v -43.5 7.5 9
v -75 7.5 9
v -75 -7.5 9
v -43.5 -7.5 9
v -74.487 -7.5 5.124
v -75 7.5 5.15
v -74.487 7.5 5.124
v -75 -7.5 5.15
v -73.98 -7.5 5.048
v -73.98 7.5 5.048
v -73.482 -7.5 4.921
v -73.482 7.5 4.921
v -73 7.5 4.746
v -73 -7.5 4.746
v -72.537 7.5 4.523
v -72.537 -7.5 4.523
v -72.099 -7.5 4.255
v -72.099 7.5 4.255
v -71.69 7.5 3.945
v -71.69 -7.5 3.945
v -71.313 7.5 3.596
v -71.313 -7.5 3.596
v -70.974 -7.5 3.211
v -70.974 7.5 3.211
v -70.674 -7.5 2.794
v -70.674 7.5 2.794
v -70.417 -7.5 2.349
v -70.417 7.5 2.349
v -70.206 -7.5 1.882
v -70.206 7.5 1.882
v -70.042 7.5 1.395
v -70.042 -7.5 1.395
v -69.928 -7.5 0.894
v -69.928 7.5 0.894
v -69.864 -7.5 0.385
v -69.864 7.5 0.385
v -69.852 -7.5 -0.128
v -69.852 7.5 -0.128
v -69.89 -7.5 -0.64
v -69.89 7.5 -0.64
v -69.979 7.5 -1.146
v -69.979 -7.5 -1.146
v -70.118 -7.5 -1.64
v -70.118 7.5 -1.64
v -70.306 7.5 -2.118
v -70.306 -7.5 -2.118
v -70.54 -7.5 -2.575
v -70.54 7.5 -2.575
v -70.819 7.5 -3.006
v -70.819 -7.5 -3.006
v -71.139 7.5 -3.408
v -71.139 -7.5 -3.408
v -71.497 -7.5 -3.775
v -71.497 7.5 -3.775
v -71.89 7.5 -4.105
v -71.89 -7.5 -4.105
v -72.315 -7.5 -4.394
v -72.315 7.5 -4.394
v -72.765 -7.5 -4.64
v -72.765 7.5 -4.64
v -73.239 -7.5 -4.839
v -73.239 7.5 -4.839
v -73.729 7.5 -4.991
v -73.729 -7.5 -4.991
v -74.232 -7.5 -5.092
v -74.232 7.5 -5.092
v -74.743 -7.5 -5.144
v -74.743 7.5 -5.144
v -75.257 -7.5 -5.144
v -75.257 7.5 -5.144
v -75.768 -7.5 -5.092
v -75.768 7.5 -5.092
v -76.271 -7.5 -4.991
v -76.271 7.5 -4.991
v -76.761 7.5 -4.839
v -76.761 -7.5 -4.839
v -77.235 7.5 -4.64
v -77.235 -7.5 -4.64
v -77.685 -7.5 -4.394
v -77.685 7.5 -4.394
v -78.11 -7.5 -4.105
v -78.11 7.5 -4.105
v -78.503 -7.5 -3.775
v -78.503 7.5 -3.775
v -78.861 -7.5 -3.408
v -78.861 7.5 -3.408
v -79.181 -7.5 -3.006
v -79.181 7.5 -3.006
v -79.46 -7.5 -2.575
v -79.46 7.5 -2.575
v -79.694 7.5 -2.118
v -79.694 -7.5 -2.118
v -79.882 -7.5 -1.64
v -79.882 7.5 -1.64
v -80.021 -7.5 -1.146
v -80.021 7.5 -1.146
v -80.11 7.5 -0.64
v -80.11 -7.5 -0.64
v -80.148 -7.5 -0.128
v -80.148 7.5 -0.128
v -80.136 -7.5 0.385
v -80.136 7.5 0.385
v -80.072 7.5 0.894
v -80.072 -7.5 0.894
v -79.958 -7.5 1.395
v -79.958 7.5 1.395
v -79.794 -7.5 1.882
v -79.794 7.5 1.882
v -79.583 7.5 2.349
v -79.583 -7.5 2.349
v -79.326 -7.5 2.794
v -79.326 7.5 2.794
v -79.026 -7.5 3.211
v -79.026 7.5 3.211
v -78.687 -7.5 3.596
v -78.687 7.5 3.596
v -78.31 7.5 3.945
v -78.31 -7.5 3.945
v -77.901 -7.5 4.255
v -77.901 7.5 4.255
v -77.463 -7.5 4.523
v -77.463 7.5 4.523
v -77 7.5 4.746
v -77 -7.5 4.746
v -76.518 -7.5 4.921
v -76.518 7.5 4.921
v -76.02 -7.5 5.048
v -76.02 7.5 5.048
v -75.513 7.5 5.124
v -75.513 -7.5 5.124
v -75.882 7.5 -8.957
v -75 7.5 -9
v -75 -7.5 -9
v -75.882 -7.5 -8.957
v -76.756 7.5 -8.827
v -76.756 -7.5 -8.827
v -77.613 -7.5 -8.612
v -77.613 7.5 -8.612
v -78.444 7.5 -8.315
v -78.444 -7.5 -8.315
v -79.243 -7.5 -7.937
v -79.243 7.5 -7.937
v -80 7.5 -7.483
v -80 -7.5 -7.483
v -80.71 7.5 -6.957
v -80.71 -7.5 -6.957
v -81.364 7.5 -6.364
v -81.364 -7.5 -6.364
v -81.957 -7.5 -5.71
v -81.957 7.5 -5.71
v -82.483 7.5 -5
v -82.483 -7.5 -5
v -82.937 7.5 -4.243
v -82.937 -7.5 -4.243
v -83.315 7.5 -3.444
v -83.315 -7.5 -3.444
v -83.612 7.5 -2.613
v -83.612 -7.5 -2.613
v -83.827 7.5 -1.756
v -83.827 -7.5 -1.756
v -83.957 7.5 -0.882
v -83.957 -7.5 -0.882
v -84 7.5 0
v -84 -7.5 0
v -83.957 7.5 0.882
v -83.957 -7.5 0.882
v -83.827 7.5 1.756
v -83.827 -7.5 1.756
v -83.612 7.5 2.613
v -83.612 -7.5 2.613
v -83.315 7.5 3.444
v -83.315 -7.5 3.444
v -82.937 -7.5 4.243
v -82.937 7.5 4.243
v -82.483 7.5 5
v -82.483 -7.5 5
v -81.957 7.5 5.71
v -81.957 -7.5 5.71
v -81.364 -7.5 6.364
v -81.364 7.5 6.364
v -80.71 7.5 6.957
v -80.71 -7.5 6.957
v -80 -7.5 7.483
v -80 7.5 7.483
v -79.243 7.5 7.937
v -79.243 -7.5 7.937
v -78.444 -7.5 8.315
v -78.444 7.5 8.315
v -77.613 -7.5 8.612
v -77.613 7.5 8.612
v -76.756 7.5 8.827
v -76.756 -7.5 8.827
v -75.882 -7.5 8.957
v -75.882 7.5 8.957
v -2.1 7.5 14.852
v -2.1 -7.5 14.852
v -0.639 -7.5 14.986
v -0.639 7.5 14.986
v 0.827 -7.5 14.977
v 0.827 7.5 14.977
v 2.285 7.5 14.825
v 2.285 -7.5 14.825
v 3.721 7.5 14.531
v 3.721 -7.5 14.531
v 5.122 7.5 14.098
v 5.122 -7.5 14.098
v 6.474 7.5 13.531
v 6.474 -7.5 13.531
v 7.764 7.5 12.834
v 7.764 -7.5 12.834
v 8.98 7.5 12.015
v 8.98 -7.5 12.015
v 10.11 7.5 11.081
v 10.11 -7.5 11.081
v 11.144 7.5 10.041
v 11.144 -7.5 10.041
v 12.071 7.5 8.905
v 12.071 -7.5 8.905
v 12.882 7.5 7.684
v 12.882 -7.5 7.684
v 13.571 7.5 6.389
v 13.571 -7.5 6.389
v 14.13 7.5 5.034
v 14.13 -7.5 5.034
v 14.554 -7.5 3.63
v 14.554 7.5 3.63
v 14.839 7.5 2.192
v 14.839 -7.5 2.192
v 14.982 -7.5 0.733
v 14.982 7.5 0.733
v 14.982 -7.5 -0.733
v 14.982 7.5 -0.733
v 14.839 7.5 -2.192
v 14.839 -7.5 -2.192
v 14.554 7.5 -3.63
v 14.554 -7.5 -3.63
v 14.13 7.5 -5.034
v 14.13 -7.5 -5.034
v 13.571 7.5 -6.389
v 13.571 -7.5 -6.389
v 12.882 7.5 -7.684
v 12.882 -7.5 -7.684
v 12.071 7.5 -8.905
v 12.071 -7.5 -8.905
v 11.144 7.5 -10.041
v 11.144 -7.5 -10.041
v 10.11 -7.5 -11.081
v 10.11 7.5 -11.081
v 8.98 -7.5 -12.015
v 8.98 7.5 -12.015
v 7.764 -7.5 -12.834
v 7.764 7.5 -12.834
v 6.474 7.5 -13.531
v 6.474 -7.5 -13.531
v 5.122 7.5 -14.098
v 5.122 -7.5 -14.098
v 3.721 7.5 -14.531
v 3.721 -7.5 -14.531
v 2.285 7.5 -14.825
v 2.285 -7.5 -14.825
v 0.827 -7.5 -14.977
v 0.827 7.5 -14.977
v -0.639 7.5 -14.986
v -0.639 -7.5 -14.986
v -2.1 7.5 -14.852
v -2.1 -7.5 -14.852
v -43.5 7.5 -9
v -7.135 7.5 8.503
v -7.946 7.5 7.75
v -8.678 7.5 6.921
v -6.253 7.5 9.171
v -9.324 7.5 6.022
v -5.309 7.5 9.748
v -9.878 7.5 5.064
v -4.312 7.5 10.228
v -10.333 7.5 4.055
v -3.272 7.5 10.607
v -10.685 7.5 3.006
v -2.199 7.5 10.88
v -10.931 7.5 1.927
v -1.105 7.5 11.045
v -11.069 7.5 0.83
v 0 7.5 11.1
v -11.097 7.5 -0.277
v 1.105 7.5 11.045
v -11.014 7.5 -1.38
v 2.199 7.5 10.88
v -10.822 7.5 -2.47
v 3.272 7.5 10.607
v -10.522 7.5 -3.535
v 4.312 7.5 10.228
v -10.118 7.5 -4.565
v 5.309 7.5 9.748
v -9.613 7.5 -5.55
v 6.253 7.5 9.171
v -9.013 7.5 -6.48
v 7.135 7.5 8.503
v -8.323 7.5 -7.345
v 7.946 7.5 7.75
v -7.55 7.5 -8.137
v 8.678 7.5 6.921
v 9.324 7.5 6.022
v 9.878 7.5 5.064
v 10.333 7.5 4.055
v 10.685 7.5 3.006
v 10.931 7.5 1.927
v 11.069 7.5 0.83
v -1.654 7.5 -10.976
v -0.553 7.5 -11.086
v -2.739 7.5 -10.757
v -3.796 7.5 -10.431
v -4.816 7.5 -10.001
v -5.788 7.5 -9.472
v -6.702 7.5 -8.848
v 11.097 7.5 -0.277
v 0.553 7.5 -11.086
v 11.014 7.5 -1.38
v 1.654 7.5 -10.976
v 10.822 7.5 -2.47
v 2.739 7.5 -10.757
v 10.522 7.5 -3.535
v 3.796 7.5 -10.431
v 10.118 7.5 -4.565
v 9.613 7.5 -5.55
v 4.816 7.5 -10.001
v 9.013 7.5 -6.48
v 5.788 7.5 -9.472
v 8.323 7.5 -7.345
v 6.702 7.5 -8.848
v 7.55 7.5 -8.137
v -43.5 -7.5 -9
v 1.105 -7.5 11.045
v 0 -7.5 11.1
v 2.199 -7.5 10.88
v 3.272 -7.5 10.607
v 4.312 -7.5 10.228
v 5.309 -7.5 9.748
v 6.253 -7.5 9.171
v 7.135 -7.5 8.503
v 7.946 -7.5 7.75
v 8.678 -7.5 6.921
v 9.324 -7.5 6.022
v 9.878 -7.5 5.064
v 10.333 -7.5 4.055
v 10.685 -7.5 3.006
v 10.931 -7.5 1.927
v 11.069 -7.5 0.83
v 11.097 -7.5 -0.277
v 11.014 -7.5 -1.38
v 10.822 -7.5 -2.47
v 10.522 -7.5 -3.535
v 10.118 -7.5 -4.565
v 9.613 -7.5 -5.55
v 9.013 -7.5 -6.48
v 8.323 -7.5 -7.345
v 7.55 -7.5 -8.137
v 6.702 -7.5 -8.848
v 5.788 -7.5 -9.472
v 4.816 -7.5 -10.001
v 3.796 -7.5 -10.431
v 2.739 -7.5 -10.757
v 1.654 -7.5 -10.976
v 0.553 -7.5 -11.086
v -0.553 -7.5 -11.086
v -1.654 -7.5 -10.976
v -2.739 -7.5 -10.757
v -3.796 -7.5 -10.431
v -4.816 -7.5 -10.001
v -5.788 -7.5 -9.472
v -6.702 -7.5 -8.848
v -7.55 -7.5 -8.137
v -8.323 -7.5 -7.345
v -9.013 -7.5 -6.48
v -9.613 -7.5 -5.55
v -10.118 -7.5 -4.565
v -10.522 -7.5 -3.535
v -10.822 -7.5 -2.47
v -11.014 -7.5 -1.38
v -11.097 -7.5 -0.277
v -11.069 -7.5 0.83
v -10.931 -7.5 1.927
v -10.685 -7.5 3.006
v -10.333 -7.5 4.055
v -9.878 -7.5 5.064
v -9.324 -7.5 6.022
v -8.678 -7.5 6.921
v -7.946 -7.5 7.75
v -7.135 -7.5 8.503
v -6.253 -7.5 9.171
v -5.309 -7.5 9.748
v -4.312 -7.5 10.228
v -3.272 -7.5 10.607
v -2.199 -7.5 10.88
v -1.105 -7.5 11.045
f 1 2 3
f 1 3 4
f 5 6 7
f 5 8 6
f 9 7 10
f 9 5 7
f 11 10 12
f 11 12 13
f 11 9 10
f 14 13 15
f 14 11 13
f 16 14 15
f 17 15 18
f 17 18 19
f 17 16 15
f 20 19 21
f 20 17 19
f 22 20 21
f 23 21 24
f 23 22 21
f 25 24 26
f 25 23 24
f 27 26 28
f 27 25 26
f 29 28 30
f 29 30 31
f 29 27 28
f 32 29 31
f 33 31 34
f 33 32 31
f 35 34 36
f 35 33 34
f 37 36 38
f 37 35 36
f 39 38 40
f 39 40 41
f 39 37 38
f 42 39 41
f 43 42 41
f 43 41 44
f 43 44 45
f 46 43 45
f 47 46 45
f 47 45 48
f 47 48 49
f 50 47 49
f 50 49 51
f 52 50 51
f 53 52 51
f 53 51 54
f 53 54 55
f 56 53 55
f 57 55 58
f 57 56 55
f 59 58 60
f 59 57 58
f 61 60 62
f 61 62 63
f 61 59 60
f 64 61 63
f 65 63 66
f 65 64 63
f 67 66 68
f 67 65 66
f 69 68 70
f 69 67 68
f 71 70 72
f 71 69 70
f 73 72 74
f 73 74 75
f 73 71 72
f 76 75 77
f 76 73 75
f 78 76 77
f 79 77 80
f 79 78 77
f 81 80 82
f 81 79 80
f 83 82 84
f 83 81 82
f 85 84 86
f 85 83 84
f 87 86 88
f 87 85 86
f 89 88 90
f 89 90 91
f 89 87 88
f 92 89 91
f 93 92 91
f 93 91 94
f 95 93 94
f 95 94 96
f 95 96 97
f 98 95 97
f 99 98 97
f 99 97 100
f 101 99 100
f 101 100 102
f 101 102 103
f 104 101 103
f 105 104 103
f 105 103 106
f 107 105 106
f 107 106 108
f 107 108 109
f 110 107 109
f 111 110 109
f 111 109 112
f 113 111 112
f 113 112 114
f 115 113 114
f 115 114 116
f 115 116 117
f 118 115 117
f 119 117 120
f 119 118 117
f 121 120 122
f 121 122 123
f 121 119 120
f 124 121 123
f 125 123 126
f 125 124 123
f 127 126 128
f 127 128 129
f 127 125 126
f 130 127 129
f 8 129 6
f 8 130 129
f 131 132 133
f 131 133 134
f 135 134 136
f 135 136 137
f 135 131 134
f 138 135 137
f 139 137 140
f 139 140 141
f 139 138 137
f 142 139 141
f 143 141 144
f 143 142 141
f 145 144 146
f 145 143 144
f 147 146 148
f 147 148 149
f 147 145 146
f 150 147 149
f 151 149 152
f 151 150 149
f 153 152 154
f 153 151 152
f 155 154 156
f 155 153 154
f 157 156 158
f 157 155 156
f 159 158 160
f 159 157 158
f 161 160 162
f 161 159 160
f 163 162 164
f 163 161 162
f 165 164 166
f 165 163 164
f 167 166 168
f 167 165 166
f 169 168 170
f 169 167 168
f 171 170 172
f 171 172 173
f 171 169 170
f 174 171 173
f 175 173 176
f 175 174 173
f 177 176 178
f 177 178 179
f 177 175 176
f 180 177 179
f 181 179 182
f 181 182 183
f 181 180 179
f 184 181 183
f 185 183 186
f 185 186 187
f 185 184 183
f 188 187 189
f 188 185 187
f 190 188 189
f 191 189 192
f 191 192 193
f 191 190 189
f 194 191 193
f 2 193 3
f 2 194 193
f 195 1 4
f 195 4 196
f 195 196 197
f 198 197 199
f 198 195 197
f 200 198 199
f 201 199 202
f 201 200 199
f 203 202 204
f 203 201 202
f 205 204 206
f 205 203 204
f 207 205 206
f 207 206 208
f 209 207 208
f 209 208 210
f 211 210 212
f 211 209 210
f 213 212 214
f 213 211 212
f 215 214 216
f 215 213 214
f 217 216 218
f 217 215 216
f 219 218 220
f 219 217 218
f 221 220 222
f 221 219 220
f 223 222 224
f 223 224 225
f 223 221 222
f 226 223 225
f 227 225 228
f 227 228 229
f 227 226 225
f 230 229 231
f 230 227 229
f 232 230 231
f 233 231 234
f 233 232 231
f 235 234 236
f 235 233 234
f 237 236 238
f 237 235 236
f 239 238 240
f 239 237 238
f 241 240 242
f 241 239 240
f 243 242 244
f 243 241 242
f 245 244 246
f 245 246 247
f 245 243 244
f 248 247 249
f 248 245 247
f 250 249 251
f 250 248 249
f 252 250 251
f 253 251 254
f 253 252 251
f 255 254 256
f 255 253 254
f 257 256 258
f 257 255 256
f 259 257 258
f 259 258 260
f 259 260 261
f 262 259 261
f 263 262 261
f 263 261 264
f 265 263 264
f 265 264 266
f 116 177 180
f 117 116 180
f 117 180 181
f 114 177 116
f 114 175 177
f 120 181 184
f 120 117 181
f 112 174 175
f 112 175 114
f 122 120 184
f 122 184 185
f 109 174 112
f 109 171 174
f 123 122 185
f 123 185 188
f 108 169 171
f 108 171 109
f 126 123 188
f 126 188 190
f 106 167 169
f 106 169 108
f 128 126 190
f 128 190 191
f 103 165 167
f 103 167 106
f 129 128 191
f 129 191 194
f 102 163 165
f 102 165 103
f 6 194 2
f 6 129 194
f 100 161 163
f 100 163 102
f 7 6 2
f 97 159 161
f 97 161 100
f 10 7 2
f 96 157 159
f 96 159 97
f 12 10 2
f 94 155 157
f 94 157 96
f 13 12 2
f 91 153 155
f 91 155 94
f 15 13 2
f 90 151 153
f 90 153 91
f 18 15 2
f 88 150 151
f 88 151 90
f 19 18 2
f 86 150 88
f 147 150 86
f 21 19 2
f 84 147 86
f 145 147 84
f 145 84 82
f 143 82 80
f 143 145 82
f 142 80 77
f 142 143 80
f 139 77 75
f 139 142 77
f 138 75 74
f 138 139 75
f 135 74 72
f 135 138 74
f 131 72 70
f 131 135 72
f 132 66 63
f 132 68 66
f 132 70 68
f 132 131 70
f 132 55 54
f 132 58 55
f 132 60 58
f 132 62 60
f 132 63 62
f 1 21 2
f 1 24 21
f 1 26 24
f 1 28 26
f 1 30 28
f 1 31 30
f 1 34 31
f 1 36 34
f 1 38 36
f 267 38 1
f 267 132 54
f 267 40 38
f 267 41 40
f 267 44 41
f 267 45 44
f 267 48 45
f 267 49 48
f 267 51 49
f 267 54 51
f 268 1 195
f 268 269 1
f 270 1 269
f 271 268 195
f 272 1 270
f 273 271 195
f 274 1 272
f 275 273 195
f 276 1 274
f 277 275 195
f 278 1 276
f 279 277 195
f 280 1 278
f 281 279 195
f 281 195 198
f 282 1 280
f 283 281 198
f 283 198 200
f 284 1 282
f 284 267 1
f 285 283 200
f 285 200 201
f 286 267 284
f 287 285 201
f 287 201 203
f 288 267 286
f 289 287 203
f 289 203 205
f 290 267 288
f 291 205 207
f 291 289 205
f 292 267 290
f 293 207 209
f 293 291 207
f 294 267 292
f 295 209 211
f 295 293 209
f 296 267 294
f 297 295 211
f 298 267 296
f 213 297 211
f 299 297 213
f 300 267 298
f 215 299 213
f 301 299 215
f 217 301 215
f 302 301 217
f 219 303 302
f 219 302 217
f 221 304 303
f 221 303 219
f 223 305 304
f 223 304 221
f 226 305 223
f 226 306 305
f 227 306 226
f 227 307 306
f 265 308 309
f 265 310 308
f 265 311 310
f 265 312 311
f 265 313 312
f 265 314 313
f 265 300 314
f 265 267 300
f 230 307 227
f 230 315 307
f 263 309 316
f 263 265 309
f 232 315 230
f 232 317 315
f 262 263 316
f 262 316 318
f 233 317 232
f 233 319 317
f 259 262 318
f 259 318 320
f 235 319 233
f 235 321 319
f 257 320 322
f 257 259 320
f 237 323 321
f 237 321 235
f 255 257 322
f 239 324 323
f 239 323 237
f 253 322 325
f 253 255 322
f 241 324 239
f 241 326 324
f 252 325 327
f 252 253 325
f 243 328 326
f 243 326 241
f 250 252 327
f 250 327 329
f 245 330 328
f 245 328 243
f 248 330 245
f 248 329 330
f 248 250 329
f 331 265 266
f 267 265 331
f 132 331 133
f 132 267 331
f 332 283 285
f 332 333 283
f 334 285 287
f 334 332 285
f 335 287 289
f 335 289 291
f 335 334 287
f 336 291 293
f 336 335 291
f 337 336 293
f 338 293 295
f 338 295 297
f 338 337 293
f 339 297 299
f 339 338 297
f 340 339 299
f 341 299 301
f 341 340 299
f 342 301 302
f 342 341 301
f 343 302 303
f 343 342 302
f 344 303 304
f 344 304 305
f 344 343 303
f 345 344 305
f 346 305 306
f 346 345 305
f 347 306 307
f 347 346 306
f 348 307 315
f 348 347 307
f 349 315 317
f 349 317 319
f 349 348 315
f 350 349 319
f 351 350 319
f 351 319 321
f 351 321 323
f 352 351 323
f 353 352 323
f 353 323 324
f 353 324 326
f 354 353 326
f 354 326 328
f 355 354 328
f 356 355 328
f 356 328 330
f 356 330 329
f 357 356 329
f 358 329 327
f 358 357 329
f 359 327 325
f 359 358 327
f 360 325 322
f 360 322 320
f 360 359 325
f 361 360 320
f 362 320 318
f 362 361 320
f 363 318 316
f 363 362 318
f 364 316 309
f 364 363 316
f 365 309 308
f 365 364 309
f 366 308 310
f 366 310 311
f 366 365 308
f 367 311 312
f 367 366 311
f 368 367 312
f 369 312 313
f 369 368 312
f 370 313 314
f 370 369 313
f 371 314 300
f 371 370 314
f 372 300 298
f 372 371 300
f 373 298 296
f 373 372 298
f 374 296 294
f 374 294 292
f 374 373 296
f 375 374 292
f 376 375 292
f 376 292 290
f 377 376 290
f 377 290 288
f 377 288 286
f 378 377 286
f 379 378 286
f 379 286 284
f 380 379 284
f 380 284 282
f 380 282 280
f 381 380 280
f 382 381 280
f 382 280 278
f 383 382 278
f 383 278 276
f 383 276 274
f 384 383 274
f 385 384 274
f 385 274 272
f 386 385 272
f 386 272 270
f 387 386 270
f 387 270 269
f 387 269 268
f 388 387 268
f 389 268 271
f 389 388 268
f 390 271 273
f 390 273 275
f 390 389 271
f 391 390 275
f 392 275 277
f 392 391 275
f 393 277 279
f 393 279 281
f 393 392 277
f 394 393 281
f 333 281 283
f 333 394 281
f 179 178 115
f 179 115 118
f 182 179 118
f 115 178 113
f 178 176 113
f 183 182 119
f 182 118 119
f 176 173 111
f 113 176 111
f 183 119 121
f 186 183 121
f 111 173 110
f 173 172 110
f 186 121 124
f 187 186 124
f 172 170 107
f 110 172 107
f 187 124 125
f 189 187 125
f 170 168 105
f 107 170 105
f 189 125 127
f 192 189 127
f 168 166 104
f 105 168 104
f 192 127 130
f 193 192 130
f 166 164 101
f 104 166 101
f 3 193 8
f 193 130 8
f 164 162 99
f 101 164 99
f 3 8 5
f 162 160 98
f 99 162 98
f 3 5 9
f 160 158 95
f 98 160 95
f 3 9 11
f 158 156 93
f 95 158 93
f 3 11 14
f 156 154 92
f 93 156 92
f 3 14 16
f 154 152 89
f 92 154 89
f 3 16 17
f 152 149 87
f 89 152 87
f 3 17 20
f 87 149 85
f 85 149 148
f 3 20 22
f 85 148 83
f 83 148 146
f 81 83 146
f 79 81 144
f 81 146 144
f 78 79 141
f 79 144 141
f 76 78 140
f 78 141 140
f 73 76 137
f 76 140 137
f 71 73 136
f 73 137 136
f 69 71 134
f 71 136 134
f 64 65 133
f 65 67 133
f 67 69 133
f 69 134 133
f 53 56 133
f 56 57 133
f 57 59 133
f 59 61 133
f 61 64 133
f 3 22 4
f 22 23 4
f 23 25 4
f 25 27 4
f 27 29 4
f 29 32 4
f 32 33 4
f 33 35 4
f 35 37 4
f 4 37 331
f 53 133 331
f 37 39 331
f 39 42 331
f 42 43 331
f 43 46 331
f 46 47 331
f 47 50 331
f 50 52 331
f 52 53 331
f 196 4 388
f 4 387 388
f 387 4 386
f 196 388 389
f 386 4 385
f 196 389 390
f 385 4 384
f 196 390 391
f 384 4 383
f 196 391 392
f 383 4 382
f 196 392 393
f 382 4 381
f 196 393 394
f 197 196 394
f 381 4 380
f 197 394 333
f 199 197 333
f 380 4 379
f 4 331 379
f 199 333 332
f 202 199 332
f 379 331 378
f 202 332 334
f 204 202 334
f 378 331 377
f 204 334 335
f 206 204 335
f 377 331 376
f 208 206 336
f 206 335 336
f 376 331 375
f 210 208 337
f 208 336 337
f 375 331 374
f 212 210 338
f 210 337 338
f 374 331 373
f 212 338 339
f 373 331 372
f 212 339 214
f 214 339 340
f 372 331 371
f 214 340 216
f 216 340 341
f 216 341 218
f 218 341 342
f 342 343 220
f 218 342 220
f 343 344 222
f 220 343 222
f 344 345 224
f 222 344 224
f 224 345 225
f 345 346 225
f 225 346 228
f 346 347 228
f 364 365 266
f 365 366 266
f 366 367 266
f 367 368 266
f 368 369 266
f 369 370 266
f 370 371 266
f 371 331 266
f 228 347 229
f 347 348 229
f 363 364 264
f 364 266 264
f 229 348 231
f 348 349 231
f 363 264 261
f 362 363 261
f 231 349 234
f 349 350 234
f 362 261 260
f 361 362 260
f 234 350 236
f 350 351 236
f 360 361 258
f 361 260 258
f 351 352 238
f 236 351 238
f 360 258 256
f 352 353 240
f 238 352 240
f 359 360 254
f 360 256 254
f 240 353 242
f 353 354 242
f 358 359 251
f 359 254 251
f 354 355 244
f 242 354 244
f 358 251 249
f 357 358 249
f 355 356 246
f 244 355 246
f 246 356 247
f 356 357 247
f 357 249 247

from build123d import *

# Parameters (mm, degrees)
SKETCH2_R           = 11.1
SKETCH2_R_2         = 5.15
BOSS_EXTRUDE2_DEPTH = 7.5


with BuildPart() as part:
    # Sketch2 → Boss-Extrude2 (new, symmetric)
    with BuildSketch(Plane(origin=(0, 0, 0), x_dir=(1, 0, 0), z_dir=(0, 1, 0))):
        with BuildLine():
            Line((-43.5, 9), (-75, 9))
            ThreePointArc((-75, 9), (-84, 0), (-75, -9))
            Line((-75, -9), (-43.5, -9))
            Line((-43.5, -9), (-2.099515649, -14.852341029))
            ThreePointArc((-2.099515649, -14.852341029), (15, 0), (-2.099515649, 14.852341029))
            Line((-2.099515649, 14.852341029), (-43.5, 9))
        make_face()
        Circle(SKETCH2_R, mode=Mode.SUBTRACT)
        with Locations((-75, 0)):
            Circle(SKETCH2_R_2, mode=Mode.SUBTRACT)
    extrude(amount=BOSS_EXTRUDE2_DEPTH, both=True)


solid = part.part
